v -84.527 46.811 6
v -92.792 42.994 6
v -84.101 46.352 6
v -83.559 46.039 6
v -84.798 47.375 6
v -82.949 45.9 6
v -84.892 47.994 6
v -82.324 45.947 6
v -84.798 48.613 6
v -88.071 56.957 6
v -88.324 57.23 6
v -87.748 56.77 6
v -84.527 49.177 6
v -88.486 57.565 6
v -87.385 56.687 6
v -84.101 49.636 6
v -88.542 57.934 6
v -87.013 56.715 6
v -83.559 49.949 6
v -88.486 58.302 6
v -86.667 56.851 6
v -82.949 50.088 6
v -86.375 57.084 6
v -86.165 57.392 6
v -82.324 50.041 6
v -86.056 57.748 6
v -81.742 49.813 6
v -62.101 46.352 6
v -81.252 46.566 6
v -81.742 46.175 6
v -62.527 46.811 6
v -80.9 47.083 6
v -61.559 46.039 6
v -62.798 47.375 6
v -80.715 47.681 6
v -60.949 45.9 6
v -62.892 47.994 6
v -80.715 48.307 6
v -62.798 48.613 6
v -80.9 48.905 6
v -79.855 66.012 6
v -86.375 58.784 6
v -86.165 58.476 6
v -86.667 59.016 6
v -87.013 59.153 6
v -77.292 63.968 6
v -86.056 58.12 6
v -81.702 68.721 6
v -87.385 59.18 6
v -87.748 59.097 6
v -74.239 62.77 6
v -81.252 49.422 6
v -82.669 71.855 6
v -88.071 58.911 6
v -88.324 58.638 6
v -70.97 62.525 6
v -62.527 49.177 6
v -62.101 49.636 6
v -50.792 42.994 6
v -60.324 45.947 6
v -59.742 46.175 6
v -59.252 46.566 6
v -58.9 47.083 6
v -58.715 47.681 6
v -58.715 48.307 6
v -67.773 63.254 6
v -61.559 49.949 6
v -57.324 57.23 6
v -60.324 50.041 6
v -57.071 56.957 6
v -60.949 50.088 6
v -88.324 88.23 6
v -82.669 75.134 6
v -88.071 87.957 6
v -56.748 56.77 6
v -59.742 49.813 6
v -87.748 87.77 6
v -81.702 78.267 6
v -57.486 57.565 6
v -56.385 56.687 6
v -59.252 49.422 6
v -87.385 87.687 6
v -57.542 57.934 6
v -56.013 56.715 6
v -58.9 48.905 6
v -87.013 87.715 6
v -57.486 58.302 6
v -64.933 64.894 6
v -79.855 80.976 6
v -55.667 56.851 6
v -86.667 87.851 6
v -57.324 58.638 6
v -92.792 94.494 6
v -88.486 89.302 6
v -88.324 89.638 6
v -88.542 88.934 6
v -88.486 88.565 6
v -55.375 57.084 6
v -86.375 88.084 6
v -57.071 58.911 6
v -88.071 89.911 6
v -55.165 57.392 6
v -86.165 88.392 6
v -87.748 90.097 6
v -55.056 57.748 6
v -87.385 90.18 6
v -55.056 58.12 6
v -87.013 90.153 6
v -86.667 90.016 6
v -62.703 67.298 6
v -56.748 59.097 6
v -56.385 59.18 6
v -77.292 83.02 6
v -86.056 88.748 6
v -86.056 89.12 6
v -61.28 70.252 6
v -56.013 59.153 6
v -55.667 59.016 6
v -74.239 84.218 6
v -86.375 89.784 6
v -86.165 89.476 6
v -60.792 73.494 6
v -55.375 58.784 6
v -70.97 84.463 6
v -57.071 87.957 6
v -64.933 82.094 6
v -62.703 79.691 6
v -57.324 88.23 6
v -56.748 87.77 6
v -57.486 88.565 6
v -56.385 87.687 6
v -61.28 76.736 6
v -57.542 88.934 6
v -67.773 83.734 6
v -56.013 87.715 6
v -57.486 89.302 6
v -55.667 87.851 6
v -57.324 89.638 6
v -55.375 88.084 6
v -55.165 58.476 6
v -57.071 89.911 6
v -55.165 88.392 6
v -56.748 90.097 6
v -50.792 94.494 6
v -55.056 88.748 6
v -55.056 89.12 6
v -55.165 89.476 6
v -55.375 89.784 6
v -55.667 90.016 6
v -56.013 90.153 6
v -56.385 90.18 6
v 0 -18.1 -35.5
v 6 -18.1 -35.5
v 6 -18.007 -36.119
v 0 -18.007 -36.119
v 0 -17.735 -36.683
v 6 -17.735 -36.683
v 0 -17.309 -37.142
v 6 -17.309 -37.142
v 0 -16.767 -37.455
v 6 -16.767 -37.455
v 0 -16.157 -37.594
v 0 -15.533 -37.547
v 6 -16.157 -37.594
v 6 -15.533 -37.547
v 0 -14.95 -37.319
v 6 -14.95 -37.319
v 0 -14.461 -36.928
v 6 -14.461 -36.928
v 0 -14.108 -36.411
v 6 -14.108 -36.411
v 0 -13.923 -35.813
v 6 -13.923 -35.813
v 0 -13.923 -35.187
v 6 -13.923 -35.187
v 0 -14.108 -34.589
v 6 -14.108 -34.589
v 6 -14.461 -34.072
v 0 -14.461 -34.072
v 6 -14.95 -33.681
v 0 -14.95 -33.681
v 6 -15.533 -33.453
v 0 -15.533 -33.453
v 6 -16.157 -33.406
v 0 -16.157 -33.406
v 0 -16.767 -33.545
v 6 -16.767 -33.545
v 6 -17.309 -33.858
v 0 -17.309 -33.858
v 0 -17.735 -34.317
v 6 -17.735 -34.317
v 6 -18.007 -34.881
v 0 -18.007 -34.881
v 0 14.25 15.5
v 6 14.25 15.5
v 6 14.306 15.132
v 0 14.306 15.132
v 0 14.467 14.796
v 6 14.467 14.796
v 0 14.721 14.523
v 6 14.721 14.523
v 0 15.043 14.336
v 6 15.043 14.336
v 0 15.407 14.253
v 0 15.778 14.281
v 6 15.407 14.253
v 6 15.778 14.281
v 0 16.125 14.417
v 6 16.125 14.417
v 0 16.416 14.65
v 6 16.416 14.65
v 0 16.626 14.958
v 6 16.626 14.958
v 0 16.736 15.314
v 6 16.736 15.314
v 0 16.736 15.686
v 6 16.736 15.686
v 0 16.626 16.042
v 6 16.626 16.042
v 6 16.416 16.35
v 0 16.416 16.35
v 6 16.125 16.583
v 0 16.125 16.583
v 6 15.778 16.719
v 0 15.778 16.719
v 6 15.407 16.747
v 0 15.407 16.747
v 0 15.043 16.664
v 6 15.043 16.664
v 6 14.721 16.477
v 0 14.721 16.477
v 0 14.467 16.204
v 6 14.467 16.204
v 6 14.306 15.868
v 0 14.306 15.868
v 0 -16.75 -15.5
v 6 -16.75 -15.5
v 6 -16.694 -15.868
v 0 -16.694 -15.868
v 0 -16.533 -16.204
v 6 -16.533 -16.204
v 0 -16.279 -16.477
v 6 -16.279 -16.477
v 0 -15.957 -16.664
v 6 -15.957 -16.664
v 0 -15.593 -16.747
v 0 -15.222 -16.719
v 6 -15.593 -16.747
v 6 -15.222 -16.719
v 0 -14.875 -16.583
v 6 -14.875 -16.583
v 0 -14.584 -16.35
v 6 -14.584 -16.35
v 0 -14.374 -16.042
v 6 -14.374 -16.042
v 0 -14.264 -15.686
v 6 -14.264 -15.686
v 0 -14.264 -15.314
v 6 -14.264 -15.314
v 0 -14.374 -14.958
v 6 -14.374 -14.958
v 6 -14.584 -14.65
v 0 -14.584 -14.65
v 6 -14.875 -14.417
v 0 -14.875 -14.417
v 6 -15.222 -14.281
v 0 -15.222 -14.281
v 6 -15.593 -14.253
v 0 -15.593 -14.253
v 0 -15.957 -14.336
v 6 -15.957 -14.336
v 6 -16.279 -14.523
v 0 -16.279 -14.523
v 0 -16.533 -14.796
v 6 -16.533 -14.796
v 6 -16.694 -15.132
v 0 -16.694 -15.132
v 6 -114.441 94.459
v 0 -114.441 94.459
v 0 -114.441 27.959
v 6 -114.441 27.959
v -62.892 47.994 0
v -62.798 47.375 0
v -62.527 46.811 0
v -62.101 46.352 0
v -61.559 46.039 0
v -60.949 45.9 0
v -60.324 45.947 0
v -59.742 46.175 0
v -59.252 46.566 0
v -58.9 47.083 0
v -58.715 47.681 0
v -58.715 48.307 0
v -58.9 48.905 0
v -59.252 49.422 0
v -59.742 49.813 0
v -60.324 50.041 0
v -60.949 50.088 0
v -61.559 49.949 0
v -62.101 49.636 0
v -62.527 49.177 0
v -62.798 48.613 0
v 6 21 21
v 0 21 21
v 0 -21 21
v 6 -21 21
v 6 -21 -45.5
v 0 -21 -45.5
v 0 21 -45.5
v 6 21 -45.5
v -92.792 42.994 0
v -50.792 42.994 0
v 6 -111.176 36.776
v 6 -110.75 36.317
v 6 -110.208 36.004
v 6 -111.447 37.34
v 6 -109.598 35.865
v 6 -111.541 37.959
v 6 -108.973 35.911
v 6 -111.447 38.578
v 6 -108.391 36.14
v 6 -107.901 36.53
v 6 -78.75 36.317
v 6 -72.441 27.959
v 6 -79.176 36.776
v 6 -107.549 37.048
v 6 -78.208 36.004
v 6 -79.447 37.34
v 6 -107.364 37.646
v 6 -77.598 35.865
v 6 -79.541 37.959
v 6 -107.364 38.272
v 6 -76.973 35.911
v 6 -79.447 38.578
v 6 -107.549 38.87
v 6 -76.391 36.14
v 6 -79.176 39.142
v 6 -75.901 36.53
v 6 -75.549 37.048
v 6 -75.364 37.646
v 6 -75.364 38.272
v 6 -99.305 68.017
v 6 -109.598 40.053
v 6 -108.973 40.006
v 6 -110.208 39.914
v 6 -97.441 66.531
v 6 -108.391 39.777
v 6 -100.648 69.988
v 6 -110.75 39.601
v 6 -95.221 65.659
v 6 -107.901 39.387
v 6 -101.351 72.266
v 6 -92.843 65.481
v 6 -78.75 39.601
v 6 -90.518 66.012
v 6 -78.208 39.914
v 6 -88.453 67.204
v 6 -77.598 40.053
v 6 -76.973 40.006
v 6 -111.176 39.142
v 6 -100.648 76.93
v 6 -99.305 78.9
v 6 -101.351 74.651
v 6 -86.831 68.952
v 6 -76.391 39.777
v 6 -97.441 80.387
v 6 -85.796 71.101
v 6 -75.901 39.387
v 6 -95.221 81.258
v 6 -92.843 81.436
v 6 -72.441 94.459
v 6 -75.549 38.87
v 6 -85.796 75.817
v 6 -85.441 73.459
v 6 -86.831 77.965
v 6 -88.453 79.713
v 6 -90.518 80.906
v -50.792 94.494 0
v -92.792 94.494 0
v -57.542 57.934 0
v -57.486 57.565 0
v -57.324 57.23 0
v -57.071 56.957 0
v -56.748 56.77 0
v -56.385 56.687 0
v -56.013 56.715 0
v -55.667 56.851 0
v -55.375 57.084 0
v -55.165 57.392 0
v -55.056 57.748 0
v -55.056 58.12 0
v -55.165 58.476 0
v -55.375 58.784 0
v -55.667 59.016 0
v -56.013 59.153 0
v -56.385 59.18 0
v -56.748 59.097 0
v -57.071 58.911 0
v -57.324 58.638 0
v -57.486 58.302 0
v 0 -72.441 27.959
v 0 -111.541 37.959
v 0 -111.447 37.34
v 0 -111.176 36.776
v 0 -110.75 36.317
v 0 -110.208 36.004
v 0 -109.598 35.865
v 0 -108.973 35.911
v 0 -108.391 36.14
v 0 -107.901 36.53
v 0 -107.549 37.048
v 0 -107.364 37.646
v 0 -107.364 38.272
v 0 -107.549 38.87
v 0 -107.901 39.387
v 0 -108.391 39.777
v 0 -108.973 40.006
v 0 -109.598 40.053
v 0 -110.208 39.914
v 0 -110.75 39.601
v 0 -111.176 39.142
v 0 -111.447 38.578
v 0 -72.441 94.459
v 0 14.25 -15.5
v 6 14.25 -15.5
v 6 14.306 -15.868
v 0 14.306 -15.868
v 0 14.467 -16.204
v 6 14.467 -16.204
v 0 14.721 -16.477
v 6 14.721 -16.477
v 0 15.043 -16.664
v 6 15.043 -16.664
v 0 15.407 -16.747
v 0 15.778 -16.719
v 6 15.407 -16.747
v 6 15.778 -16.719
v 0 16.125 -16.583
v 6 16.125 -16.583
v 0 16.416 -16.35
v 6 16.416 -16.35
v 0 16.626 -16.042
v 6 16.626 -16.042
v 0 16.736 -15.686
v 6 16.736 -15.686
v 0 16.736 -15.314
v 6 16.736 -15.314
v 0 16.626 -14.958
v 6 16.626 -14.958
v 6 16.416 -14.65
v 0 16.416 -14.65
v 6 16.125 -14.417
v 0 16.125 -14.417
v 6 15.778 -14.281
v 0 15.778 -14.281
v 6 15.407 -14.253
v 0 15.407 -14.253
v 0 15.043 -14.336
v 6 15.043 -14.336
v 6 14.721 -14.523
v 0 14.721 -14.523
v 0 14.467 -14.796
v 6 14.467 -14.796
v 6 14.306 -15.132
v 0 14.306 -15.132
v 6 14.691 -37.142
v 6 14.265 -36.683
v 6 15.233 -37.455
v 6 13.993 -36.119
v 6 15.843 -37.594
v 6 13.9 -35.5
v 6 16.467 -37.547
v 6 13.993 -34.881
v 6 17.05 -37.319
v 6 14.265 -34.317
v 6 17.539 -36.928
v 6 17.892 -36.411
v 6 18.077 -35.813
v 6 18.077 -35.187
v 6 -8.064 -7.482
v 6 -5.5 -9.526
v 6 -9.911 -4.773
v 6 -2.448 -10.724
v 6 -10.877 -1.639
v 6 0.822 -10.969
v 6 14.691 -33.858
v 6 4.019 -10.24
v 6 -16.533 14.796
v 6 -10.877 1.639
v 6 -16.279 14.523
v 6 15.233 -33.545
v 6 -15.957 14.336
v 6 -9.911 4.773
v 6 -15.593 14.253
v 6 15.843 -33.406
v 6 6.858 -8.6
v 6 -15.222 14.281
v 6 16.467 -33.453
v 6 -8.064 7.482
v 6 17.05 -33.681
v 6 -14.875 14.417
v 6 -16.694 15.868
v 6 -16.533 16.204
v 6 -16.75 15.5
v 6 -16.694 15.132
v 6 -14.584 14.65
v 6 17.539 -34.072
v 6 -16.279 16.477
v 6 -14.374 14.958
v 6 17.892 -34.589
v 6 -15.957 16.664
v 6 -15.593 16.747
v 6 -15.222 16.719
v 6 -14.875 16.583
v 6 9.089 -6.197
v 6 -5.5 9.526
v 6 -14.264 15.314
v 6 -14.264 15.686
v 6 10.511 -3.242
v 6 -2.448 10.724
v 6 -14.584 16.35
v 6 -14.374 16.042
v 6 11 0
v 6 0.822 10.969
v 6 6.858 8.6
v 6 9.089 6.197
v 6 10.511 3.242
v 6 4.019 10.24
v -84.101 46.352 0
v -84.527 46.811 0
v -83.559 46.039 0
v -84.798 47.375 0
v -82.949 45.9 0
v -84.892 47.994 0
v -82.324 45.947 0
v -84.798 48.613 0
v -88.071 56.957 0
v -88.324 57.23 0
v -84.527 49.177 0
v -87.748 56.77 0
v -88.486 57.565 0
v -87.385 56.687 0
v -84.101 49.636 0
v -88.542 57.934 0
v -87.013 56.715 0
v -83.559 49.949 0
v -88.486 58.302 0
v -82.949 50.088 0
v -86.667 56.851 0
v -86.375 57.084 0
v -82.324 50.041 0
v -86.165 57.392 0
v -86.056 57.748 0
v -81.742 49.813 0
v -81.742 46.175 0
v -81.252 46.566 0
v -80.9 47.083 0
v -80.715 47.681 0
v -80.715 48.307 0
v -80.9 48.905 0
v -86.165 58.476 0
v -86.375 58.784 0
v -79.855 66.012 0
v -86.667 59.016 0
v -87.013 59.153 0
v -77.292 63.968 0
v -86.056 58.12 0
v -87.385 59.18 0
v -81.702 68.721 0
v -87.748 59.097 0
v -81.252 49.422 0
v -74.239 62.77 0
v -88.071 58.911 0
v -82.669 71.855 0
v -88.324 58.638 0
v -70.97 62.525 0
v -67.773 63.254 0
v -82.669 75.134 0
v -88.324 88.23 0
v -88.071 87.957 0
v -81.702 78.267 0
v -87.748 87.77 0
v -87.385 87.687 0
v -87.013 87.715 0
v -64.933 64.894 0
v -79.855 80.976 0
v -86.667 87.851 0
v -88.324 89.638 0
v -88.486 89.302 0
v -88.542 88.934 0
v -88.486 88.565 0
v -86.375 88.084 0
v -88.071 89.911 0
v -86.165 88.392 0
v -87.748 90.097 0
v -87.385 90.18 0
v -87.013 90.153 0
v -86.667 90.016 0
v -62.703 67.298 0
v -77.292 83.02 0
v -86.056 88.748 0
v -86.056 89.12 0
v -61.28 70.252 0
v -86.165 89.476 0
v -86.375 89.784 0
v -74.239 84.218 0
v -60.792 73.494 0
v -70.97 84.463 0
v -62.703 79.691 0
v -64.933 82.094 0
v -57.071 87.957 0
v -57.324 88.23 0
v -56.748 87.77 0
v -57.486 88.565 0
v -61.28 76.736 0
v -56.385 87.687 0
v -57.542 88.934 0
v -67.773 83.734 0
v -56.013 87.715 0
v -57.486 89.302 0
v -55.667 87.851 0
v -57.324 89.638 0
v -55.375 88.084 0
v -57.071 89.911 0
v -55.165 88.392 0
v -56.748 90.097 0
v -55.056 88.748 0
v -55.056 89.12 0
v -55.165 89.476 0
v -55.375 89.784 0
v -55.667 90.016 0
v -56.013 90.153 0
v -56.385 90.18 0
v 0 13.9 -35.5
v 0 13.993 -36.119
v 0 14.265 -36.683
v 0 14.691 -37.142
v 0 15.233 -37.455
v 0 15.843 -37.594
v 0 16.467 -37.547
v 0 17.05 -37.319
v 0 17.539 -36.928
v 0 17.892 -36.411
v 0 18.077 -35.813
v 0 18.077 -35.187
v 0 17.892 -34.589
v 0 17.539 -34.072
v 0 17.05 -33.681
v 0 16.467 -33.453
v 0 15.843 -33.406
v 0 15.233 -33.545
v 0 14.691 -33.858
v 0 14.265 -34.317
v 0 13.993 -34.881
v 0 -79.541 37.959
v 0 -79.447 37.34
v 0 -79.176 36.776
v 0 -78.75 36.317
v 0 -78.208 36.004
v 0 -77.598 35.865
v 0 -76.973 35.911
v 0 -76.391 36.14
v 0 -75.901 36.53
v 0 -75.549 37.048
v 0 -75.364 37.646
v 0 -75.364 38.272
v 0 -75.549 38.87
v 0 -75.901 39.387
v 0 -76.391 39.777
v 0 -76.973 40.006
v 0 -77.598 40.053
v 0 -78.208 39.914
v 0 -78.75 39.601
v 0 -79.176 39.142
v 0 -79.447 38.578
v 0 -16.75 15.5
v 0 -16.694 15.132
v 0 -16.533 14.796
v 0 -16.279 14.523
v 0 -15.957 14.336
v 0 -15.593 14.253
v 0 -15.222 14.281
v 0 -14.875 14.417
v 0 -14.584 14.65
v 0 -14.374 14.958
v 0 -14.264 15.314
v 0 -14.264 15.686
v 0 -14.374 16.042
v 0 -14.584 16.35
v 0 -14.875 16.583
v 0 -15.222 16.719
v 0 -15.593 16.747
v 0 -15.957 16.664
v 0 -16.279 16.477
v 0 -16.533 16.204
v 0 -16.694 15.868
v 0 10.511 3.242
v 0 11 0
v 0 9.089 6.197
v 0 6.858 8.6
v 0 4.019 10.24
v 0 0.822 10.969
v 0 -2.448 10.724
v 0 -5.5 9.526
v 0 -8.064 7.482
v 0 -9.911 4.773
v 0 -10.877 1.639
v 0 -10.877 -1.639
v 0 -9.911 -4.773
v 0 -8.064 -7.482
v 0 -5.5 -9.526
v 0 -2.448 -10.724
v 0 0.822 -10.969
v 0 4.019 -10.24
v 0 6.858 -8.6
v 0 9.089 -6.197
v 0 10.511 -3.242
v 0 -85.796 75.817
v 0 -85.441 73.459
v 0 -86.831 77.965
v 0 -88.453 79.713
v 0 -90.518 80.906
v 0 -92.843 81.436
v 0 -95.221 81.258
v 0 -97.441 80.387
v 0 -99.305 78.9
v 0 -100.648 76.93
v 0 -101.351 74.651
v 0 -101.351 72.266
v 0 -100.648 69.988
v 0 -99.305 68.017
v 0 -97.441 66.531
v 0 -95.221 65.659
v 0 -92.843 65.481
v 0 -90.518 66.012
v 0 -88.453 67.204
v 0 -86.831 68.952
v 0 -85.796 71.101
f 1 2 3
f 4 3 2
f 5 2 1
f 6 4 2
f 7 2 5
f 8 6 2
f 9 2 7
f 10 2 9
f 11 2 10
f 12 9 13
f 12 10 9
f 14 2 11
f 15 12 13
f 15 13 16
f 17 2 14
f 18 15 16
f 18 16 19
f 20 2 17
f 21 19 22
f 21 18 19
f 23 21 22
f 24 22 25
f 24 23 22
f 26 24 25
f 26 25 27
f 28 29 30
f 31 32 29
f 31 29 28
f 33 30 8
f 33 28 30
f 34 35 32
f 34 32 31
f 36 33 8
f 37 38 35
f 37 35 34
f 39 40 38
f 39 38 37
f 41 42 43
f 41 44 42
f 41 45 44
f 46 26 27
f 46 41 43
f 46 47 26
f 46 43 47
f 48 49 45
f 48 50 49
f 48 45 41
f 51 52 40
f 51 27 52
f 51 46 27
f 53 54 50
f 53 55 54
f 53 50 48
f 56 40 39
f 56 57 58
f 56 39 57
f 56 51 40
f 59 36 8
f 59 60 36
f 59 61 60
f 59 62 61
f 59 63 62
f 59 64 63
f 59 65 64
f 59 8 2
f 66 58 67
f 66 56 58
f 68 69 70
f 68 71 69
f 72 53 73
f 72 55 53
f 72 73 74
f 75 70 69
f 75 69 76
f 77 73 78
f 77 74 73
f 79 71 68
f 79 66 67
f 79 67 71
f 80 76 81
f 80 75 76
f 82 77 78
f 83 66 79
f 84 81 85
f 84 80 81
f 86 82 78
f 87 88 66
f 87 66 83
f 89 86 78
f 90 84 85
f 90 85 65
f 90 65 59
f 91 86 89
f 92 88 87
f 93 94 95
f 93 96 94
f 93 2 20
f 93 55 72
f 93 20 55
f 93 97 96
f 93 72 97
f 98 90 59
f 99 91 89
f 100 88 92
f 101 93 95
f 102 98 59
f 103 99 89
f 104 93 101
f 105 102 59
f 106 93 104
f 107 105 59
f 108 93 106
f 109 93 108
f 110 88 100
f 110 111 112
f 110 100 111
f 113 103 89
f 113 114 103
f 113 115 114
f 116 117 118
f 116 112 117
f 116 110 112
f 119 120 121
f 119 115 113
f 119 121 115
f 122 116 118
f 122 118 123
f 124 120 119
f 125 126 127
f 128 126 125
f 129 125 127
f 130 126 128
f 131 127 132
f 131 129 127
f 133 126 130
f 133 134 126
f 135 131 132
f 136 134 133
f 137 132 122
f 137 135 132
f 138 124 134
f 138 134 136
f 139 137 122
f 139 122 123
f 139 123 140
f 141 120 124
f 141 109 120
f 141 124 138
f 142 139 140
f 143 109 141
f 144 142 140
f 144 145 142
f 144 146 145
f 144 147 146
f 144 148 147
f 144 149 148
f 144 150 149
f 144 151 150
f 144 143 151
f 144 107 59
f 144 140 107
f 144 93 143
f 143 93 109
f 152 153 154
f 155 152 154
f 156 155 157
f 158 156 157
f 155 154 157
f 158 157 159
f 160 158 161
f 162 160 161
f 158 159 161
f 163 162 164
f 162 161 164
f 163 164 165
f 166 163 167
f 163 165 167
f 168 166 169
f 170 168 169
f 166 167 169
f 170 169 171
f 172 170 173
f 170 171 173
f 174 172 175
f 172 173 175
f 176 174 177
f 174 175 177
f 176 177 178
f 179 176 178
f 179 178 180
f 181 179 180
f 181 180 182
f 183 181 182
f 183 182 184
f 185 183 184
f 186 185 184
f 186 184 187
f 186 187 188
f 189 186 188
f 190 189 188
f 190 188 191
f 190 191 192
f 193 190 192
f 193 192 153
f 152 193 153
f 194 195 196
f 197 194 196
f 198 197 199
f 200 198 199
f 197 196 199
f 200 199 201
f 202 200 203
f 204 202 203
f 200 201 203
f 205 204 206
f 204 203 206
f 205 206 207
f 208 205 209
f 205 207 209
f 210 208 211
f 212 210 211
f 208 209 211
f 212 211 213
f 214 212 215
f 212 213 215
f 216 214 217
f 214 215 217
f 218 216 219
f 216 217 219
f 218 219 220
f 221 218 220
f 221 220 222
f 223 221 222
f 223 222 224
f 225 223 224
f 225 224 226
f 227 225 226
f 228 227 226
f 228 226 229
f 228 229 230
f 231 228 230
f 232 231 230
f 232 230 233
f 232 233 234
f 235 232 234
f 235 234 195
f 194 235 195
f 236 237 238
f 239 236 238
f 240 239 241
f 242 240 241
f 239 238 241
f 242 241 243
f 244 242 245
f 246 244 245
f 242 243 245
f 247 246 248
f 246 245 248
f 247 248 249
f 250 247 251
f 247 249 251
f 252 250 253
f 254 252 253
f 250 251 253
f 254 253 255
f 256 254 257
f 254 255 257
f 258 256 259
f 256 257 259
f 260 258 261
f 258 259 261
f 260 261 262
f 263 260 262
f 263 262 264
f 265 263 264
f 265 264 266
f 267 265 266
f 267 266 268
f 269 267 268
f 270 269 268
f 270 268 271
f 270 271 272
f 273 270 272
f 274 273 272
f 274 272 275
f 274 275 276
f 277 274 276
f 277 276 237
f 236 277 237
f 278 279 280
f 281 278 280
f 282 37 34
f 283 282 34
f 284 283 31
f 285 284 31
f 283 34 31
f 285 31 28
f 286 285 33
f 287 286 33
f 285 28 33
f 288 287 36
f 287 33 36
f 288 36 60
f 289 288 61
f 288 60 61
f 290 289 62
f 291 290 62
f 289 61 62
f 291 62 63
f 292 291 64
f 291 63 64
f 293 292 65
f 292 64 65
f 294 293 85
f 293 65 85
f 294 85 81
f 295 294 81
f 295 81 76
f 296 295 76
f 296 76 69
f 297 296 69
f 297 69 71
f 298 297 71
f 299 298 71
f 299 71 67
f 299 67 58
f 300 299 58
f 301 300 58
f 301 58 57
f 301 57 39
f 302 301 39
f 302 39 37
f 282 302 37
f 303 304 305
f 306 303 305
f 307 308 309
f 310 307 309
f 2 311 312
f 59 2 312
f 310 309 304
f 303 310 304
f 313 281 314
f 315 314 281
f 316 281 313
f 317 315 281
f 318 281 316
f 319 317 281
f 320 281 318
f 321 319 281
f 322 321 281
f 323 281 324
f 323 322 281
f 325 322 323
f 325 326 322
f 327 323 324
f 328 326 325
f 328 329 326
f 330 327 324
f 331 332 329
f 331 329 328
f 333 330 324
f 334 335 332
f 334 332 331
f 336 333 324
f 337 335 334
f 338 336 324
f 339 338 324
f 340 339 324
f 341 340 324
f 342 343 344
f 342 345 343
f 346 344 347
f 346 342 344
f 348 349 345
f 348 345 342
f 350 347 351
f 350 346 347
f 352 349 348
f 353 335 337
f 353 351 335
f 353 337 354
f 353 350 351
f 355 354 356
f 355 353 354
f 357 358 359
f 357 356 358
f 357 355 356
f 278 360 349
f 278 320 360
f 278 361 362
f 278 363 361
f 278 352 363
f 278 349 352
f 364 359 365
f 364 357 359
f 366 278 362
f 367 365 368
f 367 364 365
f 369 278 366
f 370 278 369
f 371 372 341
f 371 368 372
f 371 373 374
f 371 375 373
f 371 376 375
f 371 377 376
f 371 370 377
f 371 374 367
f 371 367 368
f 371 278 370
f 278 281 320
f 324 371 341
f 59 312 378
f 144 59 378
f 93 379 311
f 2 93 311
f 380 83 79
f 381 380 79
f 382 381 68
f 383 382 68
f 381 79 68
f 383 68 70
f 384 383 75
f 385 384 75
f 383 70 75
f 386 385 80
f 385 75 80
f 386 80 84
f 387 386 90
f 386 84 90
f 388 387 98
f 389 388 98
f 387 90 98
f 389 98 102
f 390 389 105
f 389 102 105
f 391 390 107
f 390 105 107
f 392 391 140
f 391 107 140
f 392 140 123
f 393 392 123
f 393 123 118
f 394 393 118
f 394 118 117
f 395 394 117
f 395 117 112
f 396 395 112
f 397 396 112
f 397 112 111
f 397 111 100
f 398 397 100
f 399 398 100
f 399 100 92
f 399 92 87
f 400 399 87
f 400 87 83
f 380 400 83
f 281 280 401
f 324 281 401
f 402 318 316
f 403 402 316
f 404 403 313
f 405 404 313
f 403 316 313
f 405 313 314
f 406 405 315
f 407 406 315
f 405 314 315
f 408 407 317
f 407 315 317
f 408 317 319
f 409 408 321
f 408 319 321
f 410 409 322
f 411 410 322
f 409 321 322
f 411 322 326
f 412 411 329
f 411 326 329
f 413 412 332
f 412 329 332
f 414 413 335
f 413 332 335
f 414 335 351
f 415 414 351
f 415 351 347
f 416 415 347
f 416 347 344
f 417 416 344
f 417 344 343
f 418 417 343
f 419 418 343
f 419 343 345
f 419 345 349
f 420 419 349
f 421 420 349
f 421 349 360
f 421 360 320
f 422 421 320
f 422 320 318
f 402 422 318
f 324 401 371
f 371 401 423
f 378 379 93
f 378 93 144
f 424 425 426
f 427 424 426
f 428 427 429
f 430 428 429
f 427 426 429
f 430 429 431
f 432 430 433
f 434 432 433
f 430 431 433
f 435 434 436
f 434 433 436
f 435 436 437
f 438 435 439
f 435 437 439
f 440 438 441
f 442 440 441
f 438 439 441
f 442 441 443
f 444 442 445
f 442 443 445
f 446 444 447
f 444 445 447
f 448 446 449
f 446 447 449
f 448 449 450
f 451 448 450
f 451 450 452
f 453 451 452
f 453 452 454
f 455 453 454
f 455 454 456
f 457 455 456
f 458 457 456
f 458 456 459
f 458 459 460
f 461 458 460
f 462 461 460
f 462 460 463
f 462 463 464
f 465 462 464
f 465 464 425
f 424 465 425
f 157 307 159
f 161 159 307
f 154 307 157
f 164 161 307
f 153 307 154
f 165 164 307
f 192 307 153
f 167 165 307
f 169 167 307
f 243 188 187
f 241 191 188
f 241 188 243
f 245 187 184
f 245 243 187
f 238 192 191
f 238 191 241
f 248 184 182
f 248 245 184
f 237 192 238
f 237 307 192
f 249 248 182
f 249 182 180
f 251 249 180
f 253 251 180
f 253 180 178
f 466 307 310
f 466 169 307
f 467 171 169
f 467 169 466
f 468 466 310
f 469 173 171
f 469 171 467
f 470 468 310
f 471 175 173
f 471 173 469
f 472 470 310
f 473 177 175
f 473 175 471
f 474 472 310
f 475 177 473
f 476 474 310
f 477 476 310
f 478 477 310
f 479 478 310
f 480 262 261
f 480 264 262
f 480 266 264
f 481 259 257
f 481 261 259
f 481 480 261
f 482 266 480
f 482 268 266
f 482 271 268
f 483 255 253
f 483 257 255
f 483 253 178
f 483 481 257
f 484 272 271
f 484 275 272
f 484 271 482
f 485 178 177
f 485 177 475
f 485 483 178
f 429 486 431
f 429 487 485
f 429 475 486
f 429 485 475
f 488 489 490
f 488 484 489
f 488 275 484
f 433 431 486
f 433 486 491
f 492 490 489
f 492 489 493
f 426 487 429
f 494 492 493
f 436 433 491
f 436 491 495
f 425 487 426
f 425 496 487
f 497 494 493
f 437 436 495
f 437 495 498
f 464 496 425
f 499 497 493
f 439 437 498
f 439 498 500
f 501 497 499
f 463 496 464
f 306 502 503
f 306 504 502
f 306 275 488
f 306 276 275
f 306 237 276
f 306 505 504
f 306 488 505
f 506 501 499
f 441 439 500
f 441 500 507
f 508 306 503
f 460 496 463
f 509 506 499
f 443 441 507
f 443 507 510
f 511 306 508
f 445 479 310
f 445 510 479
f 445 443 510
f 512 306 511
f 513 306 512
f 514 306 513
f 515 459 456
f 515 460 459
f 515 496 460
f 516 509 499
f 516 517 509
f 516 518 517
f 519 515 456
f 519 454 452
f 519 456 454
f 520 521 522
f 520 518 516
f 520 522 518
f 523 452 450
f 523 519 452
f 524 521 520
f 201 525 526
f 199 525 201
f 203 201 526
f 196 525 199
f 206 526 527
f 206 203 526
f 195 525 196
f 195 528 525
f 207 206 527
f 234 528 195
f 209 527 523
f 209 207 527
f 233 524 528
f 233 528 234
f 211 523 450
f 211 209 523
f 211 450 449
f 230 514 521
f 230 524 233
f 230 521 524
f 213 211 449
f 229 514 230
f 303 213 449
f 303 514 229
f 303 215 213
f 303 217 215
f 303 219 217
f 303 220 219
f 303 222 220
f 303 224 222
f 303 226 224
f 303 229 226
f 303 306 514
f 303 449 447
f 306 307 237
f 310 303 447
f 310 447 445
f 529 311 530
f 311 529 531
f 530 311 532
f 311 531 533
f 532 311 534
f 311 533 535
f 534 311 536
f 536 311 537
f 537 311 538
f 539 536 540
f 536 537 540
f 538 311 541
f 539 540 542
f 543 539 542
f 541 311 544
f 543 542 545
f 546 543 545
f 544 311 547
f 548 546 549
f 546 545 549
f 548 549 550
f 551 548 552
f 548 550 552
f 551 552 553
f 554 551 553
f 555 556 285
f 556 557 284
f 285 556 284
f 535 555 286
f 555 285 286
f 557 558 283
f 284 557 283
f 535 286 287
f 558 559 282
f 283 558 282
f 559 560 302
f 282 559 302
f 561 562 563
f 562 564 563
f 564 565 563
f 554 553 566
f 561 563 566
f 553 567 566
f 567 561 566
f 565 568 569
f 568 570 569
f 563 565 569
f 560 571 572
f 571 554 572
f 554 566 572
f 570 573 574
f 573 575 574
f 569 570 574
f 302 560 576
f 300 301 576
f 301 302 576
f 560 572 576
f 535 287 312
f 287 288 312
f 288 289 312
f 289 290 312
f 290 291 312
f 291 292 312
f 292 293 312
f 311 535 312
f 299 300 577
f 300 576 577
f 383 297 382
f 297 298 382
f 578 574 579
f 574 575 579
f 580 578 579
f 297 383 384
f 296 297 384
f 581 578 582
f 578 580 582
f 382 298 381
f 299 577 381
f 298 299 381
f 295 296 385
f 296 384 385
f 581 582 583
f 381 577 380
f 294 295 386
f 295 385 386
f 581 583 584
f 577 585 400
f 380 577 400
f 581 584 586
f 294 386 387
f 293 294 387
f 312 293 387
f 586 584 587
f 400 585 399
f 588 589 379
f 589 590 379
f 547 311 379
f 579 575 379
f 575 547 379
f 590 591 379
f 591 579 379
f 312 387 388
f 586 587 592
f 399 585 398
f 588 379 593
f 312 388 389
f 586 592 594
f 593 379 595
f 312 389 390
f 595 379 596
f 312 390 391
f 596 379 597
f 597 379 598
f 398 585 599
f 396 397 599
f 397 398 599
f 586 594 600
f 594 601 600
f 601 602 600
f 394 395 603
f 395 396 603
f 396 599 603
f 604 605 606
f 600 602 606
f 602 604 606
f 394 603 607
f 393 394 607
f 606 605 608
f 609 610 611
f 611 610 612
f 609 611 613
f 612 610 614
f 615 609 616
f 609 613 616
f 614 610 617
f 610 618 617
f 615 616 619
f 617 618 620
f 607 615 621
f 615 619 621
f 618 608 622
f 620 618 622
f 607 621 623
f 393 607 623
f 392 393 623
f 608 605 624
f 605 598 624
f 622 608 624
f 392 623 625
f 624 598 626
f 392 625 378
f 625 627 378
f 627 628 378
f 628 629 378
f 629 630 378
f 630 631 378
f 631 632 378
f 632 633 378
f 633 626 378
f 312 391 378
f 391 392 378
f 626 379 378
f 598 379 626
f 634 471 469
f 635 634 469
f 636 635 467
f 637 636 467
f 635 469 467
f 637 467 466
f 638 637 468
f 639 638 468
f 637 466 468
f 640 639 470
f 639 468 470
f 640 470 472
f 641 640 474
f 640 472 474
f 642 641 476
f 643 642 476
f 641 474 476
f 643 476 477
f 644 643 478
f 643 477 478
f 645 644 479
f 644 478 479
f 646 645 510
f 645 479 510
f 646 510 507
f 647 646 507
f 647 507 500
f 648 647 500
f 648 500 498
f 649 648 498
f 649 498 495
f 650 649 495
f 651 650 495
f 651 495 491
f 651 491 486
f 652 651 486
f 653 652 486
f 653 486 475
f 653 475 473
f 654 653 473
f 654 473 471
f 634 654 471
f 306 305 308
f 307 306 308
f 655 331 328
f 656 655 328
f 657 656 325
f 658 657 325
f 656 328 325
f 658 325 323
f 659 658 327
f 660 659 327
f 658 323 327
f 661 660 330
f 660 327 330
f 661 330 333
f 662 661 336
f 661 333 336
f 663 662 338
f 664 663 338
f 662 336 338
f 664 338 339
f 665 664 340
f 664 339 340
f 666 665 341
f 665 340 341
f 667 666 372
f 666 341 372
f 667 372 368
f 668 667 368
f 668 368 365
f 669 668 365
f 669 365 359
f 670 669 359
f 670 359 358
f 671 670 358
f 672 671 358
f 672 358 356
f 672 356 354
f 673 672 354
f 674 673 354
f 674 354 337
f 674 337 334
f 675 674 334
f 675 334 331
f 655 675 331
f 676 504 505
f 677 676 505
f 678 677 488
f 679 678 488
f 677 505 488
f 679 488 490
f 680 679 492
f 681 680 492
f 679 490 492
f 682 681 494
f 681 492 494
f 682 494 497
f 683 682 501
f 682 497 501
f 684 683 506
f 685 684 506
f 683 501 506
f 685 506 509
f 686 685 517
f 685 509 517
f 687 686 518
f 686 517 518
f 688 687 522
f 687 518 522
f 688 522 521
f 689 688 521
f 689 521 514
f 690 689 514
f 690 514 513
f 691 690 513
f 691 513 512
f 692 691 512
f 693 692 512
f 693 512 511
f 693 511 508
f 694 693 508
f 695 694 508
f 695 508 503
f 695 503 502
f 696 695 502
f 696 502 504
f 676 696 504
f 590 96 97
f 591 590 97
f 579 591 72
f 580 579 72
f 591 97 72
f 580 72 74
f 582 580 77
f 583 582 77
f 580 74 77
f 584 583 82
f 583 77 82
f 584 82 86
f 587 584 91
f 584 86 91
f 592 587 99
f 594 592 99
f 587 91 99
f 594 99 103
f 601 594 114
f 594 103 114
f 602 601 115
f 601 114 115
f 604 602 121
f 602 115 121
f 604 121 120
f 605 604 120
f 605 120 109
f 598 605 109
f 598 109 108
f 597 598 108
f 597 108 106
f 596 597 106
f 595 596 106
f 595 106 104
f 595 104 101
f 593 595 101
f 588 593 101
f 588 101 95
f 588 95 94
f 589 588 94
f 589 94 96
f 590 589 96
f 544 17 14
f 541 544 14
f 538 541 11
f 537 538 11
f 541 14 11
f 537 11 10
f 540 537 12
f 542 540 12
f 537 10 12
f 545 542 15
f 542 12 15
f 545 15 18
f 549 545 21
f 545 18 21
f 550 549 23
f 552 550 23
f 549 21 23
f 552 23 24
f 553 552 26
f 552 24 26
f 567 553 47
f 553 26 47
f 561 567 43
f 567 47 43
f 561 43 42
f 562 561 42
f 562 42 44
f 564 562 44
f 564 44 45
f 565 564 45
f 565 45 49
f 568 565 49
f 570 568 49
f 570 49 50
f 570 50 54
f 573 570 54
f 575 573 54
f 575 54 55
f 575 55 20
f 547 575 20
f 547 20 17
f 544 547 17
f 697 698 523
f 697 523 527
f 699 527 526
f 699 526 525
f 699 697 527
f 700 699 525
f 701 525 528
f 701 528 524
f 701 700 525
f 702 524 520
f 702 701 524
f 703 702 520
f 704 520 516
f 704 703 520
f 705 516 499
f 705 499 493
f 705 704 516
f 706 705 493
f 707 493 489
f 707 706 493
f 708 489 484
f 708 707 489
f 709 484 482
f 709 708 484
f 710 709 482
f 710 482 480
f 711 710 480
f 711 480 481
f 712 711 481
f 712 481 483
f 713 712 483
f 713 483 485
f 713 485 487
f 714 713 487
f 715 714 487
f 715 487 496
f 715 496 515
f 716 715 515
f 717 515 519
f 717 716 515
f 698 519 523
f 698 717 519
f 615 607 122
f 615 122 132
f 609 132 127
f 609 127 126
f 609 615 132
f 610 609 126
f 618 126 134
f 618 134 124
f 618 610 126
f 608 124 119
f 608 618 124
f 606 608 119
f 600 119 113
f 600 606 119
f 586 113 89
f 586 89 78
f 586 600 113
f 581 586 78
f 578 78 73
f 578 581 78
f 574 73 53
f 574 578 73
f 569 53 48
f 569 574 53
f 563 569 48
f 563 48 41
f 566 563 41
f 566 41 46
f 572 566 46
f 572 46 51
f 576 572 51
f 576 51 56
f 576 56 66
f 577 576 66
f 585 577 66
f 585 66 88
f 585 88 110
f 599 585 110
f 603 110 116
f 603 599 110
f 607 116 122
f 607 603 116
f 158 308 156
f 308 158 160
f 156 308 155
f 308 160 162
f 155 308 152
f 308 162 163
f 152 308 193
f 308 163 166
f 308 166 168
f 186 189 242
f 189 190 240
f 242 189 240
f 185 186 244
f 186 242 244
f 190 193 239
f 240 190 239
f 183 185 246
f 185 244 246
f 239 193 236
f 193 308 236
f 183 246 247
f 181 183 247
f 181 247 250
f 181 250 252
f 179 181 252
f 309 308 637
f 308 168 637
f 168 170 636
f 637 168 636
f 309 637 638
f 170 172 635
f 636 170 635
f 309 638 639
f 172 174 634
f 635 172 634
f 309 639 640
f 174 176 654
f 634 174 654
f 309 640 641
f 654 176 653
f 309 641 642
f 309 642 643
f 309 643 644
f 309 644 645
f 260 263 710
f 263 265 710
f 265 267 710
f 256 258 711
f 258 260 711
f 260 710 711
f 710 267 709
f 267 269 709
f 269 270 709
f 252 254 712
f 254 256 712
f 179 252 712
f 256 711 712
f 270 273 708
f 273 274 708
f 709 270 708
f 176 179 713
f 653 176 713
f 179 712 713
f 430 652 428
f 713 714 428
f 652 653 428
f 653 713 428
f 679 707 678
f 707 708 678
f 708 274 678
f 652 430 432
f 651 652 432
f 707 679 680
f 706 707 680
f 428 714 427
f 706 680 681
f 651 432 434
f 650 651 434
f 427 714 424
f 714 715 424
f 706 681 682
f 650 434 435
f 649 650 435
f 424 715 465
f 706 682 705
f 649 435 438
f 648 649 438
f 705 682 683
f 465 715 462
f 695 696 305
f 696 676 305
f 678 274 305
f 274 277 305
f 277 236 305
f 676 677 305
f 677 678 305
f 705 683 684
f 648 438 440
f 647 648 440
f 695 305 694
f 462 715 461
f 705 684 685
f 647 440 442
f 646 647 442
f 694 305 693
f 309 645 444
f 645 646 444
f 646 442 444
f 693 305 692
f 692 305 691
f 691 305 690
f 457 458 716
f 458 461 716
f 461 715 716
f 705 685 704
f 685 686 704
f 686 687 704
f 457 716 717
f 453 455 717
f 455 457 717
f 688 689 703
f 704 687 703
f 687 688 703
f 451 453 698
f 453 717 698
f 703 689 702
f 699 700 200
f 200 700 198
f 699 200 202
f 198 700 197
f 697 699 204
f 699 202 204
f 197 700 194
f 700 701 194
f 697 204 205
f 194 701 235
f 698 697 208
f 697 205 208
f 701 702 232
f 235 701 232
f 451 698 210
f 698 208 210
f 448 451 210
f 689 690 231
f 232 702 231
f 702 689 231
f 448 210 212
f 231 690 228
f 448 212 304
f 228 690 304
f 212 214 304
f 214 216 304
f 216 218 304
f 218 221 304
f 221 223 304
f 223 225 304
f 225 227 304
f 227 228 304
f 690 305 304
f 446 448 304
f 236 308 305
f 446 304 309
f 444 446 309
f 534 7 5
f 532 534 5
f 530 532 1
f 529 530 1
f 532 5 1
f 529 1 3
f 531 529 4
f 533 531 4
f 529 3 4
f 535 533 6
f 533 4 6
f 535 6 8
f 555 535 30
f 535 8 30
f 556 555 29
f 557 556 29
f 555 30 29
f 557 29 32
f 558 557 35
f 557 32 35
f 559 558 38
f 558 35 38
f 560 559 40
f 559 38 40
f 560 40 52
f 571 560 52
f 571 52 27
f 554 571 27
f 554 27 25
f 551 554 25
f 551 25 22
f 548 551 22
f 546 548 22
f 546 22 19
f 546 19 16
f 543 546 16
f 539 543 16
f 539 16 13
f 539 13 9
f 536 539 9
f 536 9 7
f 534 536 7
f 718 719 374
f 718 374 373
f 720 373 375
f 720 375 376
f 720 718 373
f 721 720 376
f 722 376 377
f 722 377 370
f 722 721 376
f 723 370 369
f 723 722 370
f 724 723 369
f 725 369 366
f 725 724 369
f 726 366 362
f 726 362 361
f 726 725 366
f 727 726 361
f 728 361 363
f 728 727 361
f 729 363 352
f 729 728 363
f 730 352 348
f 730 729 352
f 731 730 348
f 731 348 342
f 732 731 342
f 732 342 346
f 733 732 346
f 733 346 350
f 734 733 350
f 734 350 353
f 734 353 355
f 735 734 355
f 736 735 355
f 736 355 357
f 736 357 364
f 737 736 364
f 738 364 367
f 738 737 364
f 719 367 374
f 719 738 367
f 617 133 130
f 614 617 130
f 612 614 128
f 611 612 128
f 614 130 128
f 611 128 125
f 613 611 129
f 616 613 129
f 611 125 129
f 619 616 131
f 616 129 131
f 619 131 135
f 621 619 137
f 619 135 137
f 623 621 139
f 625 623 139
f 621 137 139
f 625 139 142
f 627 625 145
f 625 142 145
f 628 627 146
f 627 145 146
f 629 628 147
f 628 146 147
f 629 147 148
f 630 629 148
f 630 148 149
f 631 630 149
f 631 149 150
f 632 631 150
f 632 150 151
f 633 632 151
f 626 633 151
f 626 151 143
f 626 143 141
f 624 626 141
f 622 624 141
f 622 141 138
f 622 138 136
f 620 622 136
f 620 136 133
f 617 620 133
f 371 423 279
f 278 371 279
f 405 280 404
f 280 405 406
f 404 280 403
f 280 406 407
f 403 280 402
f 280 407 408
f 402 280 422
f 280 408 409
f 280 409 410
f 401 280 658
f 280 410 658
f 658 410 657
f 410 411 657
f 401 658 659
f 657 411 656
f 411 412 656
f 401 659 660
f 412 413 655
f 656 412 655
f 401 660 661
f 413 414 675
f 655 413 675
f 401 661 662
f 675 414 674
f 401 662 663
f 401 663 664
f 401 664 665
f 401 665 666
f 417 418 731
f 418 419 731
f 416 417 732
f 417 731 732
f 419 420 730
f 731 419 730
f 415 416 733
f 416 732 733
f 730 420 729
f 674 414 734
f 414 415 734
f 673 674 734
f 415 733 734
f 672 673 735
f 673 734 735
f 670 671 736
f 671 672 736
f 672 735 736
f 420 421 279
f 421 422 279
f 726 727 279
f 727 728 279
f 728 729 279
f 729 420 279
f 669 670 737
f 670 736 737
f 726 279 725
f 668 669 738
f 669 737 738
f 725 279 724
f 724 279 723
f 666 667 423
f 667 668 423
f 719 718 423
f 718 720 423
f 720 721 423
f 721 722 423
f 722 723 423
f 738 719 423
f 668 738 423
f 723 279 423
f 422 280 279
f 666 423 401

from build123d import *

# Parameters (mm, degrees)
F0_R     = 2
F0_R_2   = 11
F0_W     = 42
F0_H     = 20
F0_R_3   = 2.75
F0_H_2   = 4.5
F1_DEPTH = 6
F2_R     = 8
F2_W     = 42
F2_H     = 4.5
F2_H_2   = 20
F2_R_2   = 2.75
F3_DEPTH = 6
F4_D     = 2.5
F5_D     = 4.2
F6_D     = 4.2
F7_W     = 42
F7_H     = 42
F7_R     = 2
F7_R_2   = 11
F7_H_2   = 9.5
F8_DEPTH = 6
F9_D     = 2.5
F11_D    = 4.2


with BuildPart() as f1:
    # F0 (on Right) → F1 (new body)
    with BuildSketch(Plane.YZ):
        Polygon((21, 0), (21, 21), (-21, 21), (-21, 0), (-21, -21), (21, -21), align=None)
        with Locations((-15.5, -15.5)):
            Circle(F0_R, mode=Mode.SUBTRACT)
        with Locations((15.5, -15.5)):
            Circle(F0_R, mode=Mode.SUBTRACT)
        with Locations((-15.5, 15.5)):
            Circle(F0_R, mode=Mode.SUBTRACT)
        Circle(F0_R_2, mode=Mode.SUBTRACT)
        with Locations((15.5, 15.5)):
            Circle(F0_R, mode=Mode.SUBTRACT)
        with Locations((0, -35.5)):
            Rectangle(F0_W, F0_H)
        with Locations((-16, -35.5)):
            Circle(F0_R_3, mode=Mode.SUBTRACT)
        with Locations((16, -35.5)):
            Circle(F0_R_3, mode=Mode.SUBTRACT)
        with Locations((0, -23.25)):
            Rectangle(F0_W, F0_H_2)
        with Locations((-16, -35.5)):
            Circle(F0_R_3)
        with Locations((16, -35.5)):
            Circle(F0_R_3)
        with Locations((-15.5, 15.5)):
            Circle(F0_R)
        with Locations((15.5, 15.5)):
            Circle(F0_R)
        with Locations((15.5, -15.5)):
            Circle(F0_R)
        with Locations((-15.5, -15.5)):
            Circle(F0_R)
    extrude(amount=F1_DEPTH)

    # F4 (through all)
    with Locations(Plane(origin=(0, 0, 0), x_dir=(0, 1, 0), z_dir=(-1, 0, 0))):
        with Locations((-15.5, -15.5), (15.5, -15.5), (-15.5, 15.5), (15.5, 15.5)):
            Hole(F4_D / 2)

    # F5 (through all)
    with Locations(Plane(origin=(0, 0, 0), x_dir=(0, 1, 0), z_dir=(-1, 0, 0))):
        with Locations((-16, 35.5), (16, 35.5)):
            Hole(F5_D / 2)


with BuildPart() as f3:
    # F2 (on Right) → F3 (new body)
    with BuildSketch(Plane.YZ):
        Polygon((-72.4406324148, 73.458812958), (-72.4406324148, 94.458812958), (-114.4406324148, 94.458812958), (-114.4406324148, 73.458812958), (-114.4406324148, 52.458812958), (-72.4406324148, 52.458812958), align=None)
        with Locations((-93.4406324148, 73.458812958)):
            Circle(F2_R, mode=Mode.SUBTRACT)
        with Locations((-93.4406324148, 50.208812958)):
            Rectangle(F2_W, F2_H)
        with Locations((-93.4406324148, 37.958812958)):
            Rectangle(F2_W, F2_H_2)
        with Locations((-109.4406324148, 37.958812958)):
            Circle(F2_R_2, mode=Mode.SUBTRACT)
        with Locations((-77.4406324148, 37.958812958)):
            Circle(F2_R_2, mode=Mode.SUBTRACT)
        with Locations((-109.4406324148, 37.958812958)):
            Circle(F2_R_2)
        with Locations((-77.4406324148, 37.958812958)):
            Circle(F2_R_2)
    extrude(amount=F3_DEPTH)

    # F6 (through all)
    with Locations(Plane(origin=(0, 0, 0), x_dir=(0, 1, 0), z_dir=(-1, 0, 0))):
        with Locations((-109.4406324148, -37.958812958), (-77.4406324148, -37.958812958)):
            Hole(F6_D / 2)


with BuildPart() as f8:
    # F7 (on Top) → F8 (new body)
    with BuildSketch(Plane.XY):
        with Locations((-71.791592133, 73.494081974)):
            Rectangle(F7_W, F7_H)
        with Locations((-87.291592133, 57.9338646889)):
            Circle(F7_R, mode=Mode.SUBTRACT)
        with Locations((-56.291592133, 57.9338646889)):
            Circle(F7_R, mode=Mode.SUBTRACT)
        with Locations((-87.291592133, 88.9338646889)):
            Circle(F7_R, mode=Mode.SUBTRACT)
        with Locations((-71.791592133, 73.494081974)):
            Circle(F7_R_2, mode=Mode.SUBTRACT)
        with Locations((-56.291592133, 88.9338646889)):
            Circle(F7_R, mode=Mode.SUBTRACT)
        with Locations((-71.791592133, 47.744081974)):
            Rectangle(F7_W, F7_H_2)
        with Locations((-87.291592133, 88.9338646889)):
            Circle(F7_R)
        with Locations((-56.291592133, 88.9338646889)):
            Circle(F7_R)
        with Locations((-56.291592133, 57.9338646889)):
            Circle(F7_R)
        with Locations((-87.291592133, 57.9338646889)):
            Circle(F7_R)
    extrude(amount=F8_DEPTH)

    # F9 (through all)
    with Locations(Plane(origin=(0, 0, 0), x_dir=(1, 0, 0), z_dir=(0, 0, -1))):
        with Locations((-56.291592133, -88.9338646889), (-87.291592133, -88.9338646889), (-56.291592133, -57.9338646889), (-87.291592133, -57.9338646889)):
            Hole(F9_D / 2)

    # F11 (through all)
    with Locations(Plane(origin=(0, 0, 0), x_dir=(1, 0, 0), z_dir=(0, 0, -1))):
        with Locations((-60.791592133, -47.994081974), (-82.791592133, -47.994081974)):
            Hole(F11_D / 2)


solid = Compound([f1.part, f3.part, f8.part])
